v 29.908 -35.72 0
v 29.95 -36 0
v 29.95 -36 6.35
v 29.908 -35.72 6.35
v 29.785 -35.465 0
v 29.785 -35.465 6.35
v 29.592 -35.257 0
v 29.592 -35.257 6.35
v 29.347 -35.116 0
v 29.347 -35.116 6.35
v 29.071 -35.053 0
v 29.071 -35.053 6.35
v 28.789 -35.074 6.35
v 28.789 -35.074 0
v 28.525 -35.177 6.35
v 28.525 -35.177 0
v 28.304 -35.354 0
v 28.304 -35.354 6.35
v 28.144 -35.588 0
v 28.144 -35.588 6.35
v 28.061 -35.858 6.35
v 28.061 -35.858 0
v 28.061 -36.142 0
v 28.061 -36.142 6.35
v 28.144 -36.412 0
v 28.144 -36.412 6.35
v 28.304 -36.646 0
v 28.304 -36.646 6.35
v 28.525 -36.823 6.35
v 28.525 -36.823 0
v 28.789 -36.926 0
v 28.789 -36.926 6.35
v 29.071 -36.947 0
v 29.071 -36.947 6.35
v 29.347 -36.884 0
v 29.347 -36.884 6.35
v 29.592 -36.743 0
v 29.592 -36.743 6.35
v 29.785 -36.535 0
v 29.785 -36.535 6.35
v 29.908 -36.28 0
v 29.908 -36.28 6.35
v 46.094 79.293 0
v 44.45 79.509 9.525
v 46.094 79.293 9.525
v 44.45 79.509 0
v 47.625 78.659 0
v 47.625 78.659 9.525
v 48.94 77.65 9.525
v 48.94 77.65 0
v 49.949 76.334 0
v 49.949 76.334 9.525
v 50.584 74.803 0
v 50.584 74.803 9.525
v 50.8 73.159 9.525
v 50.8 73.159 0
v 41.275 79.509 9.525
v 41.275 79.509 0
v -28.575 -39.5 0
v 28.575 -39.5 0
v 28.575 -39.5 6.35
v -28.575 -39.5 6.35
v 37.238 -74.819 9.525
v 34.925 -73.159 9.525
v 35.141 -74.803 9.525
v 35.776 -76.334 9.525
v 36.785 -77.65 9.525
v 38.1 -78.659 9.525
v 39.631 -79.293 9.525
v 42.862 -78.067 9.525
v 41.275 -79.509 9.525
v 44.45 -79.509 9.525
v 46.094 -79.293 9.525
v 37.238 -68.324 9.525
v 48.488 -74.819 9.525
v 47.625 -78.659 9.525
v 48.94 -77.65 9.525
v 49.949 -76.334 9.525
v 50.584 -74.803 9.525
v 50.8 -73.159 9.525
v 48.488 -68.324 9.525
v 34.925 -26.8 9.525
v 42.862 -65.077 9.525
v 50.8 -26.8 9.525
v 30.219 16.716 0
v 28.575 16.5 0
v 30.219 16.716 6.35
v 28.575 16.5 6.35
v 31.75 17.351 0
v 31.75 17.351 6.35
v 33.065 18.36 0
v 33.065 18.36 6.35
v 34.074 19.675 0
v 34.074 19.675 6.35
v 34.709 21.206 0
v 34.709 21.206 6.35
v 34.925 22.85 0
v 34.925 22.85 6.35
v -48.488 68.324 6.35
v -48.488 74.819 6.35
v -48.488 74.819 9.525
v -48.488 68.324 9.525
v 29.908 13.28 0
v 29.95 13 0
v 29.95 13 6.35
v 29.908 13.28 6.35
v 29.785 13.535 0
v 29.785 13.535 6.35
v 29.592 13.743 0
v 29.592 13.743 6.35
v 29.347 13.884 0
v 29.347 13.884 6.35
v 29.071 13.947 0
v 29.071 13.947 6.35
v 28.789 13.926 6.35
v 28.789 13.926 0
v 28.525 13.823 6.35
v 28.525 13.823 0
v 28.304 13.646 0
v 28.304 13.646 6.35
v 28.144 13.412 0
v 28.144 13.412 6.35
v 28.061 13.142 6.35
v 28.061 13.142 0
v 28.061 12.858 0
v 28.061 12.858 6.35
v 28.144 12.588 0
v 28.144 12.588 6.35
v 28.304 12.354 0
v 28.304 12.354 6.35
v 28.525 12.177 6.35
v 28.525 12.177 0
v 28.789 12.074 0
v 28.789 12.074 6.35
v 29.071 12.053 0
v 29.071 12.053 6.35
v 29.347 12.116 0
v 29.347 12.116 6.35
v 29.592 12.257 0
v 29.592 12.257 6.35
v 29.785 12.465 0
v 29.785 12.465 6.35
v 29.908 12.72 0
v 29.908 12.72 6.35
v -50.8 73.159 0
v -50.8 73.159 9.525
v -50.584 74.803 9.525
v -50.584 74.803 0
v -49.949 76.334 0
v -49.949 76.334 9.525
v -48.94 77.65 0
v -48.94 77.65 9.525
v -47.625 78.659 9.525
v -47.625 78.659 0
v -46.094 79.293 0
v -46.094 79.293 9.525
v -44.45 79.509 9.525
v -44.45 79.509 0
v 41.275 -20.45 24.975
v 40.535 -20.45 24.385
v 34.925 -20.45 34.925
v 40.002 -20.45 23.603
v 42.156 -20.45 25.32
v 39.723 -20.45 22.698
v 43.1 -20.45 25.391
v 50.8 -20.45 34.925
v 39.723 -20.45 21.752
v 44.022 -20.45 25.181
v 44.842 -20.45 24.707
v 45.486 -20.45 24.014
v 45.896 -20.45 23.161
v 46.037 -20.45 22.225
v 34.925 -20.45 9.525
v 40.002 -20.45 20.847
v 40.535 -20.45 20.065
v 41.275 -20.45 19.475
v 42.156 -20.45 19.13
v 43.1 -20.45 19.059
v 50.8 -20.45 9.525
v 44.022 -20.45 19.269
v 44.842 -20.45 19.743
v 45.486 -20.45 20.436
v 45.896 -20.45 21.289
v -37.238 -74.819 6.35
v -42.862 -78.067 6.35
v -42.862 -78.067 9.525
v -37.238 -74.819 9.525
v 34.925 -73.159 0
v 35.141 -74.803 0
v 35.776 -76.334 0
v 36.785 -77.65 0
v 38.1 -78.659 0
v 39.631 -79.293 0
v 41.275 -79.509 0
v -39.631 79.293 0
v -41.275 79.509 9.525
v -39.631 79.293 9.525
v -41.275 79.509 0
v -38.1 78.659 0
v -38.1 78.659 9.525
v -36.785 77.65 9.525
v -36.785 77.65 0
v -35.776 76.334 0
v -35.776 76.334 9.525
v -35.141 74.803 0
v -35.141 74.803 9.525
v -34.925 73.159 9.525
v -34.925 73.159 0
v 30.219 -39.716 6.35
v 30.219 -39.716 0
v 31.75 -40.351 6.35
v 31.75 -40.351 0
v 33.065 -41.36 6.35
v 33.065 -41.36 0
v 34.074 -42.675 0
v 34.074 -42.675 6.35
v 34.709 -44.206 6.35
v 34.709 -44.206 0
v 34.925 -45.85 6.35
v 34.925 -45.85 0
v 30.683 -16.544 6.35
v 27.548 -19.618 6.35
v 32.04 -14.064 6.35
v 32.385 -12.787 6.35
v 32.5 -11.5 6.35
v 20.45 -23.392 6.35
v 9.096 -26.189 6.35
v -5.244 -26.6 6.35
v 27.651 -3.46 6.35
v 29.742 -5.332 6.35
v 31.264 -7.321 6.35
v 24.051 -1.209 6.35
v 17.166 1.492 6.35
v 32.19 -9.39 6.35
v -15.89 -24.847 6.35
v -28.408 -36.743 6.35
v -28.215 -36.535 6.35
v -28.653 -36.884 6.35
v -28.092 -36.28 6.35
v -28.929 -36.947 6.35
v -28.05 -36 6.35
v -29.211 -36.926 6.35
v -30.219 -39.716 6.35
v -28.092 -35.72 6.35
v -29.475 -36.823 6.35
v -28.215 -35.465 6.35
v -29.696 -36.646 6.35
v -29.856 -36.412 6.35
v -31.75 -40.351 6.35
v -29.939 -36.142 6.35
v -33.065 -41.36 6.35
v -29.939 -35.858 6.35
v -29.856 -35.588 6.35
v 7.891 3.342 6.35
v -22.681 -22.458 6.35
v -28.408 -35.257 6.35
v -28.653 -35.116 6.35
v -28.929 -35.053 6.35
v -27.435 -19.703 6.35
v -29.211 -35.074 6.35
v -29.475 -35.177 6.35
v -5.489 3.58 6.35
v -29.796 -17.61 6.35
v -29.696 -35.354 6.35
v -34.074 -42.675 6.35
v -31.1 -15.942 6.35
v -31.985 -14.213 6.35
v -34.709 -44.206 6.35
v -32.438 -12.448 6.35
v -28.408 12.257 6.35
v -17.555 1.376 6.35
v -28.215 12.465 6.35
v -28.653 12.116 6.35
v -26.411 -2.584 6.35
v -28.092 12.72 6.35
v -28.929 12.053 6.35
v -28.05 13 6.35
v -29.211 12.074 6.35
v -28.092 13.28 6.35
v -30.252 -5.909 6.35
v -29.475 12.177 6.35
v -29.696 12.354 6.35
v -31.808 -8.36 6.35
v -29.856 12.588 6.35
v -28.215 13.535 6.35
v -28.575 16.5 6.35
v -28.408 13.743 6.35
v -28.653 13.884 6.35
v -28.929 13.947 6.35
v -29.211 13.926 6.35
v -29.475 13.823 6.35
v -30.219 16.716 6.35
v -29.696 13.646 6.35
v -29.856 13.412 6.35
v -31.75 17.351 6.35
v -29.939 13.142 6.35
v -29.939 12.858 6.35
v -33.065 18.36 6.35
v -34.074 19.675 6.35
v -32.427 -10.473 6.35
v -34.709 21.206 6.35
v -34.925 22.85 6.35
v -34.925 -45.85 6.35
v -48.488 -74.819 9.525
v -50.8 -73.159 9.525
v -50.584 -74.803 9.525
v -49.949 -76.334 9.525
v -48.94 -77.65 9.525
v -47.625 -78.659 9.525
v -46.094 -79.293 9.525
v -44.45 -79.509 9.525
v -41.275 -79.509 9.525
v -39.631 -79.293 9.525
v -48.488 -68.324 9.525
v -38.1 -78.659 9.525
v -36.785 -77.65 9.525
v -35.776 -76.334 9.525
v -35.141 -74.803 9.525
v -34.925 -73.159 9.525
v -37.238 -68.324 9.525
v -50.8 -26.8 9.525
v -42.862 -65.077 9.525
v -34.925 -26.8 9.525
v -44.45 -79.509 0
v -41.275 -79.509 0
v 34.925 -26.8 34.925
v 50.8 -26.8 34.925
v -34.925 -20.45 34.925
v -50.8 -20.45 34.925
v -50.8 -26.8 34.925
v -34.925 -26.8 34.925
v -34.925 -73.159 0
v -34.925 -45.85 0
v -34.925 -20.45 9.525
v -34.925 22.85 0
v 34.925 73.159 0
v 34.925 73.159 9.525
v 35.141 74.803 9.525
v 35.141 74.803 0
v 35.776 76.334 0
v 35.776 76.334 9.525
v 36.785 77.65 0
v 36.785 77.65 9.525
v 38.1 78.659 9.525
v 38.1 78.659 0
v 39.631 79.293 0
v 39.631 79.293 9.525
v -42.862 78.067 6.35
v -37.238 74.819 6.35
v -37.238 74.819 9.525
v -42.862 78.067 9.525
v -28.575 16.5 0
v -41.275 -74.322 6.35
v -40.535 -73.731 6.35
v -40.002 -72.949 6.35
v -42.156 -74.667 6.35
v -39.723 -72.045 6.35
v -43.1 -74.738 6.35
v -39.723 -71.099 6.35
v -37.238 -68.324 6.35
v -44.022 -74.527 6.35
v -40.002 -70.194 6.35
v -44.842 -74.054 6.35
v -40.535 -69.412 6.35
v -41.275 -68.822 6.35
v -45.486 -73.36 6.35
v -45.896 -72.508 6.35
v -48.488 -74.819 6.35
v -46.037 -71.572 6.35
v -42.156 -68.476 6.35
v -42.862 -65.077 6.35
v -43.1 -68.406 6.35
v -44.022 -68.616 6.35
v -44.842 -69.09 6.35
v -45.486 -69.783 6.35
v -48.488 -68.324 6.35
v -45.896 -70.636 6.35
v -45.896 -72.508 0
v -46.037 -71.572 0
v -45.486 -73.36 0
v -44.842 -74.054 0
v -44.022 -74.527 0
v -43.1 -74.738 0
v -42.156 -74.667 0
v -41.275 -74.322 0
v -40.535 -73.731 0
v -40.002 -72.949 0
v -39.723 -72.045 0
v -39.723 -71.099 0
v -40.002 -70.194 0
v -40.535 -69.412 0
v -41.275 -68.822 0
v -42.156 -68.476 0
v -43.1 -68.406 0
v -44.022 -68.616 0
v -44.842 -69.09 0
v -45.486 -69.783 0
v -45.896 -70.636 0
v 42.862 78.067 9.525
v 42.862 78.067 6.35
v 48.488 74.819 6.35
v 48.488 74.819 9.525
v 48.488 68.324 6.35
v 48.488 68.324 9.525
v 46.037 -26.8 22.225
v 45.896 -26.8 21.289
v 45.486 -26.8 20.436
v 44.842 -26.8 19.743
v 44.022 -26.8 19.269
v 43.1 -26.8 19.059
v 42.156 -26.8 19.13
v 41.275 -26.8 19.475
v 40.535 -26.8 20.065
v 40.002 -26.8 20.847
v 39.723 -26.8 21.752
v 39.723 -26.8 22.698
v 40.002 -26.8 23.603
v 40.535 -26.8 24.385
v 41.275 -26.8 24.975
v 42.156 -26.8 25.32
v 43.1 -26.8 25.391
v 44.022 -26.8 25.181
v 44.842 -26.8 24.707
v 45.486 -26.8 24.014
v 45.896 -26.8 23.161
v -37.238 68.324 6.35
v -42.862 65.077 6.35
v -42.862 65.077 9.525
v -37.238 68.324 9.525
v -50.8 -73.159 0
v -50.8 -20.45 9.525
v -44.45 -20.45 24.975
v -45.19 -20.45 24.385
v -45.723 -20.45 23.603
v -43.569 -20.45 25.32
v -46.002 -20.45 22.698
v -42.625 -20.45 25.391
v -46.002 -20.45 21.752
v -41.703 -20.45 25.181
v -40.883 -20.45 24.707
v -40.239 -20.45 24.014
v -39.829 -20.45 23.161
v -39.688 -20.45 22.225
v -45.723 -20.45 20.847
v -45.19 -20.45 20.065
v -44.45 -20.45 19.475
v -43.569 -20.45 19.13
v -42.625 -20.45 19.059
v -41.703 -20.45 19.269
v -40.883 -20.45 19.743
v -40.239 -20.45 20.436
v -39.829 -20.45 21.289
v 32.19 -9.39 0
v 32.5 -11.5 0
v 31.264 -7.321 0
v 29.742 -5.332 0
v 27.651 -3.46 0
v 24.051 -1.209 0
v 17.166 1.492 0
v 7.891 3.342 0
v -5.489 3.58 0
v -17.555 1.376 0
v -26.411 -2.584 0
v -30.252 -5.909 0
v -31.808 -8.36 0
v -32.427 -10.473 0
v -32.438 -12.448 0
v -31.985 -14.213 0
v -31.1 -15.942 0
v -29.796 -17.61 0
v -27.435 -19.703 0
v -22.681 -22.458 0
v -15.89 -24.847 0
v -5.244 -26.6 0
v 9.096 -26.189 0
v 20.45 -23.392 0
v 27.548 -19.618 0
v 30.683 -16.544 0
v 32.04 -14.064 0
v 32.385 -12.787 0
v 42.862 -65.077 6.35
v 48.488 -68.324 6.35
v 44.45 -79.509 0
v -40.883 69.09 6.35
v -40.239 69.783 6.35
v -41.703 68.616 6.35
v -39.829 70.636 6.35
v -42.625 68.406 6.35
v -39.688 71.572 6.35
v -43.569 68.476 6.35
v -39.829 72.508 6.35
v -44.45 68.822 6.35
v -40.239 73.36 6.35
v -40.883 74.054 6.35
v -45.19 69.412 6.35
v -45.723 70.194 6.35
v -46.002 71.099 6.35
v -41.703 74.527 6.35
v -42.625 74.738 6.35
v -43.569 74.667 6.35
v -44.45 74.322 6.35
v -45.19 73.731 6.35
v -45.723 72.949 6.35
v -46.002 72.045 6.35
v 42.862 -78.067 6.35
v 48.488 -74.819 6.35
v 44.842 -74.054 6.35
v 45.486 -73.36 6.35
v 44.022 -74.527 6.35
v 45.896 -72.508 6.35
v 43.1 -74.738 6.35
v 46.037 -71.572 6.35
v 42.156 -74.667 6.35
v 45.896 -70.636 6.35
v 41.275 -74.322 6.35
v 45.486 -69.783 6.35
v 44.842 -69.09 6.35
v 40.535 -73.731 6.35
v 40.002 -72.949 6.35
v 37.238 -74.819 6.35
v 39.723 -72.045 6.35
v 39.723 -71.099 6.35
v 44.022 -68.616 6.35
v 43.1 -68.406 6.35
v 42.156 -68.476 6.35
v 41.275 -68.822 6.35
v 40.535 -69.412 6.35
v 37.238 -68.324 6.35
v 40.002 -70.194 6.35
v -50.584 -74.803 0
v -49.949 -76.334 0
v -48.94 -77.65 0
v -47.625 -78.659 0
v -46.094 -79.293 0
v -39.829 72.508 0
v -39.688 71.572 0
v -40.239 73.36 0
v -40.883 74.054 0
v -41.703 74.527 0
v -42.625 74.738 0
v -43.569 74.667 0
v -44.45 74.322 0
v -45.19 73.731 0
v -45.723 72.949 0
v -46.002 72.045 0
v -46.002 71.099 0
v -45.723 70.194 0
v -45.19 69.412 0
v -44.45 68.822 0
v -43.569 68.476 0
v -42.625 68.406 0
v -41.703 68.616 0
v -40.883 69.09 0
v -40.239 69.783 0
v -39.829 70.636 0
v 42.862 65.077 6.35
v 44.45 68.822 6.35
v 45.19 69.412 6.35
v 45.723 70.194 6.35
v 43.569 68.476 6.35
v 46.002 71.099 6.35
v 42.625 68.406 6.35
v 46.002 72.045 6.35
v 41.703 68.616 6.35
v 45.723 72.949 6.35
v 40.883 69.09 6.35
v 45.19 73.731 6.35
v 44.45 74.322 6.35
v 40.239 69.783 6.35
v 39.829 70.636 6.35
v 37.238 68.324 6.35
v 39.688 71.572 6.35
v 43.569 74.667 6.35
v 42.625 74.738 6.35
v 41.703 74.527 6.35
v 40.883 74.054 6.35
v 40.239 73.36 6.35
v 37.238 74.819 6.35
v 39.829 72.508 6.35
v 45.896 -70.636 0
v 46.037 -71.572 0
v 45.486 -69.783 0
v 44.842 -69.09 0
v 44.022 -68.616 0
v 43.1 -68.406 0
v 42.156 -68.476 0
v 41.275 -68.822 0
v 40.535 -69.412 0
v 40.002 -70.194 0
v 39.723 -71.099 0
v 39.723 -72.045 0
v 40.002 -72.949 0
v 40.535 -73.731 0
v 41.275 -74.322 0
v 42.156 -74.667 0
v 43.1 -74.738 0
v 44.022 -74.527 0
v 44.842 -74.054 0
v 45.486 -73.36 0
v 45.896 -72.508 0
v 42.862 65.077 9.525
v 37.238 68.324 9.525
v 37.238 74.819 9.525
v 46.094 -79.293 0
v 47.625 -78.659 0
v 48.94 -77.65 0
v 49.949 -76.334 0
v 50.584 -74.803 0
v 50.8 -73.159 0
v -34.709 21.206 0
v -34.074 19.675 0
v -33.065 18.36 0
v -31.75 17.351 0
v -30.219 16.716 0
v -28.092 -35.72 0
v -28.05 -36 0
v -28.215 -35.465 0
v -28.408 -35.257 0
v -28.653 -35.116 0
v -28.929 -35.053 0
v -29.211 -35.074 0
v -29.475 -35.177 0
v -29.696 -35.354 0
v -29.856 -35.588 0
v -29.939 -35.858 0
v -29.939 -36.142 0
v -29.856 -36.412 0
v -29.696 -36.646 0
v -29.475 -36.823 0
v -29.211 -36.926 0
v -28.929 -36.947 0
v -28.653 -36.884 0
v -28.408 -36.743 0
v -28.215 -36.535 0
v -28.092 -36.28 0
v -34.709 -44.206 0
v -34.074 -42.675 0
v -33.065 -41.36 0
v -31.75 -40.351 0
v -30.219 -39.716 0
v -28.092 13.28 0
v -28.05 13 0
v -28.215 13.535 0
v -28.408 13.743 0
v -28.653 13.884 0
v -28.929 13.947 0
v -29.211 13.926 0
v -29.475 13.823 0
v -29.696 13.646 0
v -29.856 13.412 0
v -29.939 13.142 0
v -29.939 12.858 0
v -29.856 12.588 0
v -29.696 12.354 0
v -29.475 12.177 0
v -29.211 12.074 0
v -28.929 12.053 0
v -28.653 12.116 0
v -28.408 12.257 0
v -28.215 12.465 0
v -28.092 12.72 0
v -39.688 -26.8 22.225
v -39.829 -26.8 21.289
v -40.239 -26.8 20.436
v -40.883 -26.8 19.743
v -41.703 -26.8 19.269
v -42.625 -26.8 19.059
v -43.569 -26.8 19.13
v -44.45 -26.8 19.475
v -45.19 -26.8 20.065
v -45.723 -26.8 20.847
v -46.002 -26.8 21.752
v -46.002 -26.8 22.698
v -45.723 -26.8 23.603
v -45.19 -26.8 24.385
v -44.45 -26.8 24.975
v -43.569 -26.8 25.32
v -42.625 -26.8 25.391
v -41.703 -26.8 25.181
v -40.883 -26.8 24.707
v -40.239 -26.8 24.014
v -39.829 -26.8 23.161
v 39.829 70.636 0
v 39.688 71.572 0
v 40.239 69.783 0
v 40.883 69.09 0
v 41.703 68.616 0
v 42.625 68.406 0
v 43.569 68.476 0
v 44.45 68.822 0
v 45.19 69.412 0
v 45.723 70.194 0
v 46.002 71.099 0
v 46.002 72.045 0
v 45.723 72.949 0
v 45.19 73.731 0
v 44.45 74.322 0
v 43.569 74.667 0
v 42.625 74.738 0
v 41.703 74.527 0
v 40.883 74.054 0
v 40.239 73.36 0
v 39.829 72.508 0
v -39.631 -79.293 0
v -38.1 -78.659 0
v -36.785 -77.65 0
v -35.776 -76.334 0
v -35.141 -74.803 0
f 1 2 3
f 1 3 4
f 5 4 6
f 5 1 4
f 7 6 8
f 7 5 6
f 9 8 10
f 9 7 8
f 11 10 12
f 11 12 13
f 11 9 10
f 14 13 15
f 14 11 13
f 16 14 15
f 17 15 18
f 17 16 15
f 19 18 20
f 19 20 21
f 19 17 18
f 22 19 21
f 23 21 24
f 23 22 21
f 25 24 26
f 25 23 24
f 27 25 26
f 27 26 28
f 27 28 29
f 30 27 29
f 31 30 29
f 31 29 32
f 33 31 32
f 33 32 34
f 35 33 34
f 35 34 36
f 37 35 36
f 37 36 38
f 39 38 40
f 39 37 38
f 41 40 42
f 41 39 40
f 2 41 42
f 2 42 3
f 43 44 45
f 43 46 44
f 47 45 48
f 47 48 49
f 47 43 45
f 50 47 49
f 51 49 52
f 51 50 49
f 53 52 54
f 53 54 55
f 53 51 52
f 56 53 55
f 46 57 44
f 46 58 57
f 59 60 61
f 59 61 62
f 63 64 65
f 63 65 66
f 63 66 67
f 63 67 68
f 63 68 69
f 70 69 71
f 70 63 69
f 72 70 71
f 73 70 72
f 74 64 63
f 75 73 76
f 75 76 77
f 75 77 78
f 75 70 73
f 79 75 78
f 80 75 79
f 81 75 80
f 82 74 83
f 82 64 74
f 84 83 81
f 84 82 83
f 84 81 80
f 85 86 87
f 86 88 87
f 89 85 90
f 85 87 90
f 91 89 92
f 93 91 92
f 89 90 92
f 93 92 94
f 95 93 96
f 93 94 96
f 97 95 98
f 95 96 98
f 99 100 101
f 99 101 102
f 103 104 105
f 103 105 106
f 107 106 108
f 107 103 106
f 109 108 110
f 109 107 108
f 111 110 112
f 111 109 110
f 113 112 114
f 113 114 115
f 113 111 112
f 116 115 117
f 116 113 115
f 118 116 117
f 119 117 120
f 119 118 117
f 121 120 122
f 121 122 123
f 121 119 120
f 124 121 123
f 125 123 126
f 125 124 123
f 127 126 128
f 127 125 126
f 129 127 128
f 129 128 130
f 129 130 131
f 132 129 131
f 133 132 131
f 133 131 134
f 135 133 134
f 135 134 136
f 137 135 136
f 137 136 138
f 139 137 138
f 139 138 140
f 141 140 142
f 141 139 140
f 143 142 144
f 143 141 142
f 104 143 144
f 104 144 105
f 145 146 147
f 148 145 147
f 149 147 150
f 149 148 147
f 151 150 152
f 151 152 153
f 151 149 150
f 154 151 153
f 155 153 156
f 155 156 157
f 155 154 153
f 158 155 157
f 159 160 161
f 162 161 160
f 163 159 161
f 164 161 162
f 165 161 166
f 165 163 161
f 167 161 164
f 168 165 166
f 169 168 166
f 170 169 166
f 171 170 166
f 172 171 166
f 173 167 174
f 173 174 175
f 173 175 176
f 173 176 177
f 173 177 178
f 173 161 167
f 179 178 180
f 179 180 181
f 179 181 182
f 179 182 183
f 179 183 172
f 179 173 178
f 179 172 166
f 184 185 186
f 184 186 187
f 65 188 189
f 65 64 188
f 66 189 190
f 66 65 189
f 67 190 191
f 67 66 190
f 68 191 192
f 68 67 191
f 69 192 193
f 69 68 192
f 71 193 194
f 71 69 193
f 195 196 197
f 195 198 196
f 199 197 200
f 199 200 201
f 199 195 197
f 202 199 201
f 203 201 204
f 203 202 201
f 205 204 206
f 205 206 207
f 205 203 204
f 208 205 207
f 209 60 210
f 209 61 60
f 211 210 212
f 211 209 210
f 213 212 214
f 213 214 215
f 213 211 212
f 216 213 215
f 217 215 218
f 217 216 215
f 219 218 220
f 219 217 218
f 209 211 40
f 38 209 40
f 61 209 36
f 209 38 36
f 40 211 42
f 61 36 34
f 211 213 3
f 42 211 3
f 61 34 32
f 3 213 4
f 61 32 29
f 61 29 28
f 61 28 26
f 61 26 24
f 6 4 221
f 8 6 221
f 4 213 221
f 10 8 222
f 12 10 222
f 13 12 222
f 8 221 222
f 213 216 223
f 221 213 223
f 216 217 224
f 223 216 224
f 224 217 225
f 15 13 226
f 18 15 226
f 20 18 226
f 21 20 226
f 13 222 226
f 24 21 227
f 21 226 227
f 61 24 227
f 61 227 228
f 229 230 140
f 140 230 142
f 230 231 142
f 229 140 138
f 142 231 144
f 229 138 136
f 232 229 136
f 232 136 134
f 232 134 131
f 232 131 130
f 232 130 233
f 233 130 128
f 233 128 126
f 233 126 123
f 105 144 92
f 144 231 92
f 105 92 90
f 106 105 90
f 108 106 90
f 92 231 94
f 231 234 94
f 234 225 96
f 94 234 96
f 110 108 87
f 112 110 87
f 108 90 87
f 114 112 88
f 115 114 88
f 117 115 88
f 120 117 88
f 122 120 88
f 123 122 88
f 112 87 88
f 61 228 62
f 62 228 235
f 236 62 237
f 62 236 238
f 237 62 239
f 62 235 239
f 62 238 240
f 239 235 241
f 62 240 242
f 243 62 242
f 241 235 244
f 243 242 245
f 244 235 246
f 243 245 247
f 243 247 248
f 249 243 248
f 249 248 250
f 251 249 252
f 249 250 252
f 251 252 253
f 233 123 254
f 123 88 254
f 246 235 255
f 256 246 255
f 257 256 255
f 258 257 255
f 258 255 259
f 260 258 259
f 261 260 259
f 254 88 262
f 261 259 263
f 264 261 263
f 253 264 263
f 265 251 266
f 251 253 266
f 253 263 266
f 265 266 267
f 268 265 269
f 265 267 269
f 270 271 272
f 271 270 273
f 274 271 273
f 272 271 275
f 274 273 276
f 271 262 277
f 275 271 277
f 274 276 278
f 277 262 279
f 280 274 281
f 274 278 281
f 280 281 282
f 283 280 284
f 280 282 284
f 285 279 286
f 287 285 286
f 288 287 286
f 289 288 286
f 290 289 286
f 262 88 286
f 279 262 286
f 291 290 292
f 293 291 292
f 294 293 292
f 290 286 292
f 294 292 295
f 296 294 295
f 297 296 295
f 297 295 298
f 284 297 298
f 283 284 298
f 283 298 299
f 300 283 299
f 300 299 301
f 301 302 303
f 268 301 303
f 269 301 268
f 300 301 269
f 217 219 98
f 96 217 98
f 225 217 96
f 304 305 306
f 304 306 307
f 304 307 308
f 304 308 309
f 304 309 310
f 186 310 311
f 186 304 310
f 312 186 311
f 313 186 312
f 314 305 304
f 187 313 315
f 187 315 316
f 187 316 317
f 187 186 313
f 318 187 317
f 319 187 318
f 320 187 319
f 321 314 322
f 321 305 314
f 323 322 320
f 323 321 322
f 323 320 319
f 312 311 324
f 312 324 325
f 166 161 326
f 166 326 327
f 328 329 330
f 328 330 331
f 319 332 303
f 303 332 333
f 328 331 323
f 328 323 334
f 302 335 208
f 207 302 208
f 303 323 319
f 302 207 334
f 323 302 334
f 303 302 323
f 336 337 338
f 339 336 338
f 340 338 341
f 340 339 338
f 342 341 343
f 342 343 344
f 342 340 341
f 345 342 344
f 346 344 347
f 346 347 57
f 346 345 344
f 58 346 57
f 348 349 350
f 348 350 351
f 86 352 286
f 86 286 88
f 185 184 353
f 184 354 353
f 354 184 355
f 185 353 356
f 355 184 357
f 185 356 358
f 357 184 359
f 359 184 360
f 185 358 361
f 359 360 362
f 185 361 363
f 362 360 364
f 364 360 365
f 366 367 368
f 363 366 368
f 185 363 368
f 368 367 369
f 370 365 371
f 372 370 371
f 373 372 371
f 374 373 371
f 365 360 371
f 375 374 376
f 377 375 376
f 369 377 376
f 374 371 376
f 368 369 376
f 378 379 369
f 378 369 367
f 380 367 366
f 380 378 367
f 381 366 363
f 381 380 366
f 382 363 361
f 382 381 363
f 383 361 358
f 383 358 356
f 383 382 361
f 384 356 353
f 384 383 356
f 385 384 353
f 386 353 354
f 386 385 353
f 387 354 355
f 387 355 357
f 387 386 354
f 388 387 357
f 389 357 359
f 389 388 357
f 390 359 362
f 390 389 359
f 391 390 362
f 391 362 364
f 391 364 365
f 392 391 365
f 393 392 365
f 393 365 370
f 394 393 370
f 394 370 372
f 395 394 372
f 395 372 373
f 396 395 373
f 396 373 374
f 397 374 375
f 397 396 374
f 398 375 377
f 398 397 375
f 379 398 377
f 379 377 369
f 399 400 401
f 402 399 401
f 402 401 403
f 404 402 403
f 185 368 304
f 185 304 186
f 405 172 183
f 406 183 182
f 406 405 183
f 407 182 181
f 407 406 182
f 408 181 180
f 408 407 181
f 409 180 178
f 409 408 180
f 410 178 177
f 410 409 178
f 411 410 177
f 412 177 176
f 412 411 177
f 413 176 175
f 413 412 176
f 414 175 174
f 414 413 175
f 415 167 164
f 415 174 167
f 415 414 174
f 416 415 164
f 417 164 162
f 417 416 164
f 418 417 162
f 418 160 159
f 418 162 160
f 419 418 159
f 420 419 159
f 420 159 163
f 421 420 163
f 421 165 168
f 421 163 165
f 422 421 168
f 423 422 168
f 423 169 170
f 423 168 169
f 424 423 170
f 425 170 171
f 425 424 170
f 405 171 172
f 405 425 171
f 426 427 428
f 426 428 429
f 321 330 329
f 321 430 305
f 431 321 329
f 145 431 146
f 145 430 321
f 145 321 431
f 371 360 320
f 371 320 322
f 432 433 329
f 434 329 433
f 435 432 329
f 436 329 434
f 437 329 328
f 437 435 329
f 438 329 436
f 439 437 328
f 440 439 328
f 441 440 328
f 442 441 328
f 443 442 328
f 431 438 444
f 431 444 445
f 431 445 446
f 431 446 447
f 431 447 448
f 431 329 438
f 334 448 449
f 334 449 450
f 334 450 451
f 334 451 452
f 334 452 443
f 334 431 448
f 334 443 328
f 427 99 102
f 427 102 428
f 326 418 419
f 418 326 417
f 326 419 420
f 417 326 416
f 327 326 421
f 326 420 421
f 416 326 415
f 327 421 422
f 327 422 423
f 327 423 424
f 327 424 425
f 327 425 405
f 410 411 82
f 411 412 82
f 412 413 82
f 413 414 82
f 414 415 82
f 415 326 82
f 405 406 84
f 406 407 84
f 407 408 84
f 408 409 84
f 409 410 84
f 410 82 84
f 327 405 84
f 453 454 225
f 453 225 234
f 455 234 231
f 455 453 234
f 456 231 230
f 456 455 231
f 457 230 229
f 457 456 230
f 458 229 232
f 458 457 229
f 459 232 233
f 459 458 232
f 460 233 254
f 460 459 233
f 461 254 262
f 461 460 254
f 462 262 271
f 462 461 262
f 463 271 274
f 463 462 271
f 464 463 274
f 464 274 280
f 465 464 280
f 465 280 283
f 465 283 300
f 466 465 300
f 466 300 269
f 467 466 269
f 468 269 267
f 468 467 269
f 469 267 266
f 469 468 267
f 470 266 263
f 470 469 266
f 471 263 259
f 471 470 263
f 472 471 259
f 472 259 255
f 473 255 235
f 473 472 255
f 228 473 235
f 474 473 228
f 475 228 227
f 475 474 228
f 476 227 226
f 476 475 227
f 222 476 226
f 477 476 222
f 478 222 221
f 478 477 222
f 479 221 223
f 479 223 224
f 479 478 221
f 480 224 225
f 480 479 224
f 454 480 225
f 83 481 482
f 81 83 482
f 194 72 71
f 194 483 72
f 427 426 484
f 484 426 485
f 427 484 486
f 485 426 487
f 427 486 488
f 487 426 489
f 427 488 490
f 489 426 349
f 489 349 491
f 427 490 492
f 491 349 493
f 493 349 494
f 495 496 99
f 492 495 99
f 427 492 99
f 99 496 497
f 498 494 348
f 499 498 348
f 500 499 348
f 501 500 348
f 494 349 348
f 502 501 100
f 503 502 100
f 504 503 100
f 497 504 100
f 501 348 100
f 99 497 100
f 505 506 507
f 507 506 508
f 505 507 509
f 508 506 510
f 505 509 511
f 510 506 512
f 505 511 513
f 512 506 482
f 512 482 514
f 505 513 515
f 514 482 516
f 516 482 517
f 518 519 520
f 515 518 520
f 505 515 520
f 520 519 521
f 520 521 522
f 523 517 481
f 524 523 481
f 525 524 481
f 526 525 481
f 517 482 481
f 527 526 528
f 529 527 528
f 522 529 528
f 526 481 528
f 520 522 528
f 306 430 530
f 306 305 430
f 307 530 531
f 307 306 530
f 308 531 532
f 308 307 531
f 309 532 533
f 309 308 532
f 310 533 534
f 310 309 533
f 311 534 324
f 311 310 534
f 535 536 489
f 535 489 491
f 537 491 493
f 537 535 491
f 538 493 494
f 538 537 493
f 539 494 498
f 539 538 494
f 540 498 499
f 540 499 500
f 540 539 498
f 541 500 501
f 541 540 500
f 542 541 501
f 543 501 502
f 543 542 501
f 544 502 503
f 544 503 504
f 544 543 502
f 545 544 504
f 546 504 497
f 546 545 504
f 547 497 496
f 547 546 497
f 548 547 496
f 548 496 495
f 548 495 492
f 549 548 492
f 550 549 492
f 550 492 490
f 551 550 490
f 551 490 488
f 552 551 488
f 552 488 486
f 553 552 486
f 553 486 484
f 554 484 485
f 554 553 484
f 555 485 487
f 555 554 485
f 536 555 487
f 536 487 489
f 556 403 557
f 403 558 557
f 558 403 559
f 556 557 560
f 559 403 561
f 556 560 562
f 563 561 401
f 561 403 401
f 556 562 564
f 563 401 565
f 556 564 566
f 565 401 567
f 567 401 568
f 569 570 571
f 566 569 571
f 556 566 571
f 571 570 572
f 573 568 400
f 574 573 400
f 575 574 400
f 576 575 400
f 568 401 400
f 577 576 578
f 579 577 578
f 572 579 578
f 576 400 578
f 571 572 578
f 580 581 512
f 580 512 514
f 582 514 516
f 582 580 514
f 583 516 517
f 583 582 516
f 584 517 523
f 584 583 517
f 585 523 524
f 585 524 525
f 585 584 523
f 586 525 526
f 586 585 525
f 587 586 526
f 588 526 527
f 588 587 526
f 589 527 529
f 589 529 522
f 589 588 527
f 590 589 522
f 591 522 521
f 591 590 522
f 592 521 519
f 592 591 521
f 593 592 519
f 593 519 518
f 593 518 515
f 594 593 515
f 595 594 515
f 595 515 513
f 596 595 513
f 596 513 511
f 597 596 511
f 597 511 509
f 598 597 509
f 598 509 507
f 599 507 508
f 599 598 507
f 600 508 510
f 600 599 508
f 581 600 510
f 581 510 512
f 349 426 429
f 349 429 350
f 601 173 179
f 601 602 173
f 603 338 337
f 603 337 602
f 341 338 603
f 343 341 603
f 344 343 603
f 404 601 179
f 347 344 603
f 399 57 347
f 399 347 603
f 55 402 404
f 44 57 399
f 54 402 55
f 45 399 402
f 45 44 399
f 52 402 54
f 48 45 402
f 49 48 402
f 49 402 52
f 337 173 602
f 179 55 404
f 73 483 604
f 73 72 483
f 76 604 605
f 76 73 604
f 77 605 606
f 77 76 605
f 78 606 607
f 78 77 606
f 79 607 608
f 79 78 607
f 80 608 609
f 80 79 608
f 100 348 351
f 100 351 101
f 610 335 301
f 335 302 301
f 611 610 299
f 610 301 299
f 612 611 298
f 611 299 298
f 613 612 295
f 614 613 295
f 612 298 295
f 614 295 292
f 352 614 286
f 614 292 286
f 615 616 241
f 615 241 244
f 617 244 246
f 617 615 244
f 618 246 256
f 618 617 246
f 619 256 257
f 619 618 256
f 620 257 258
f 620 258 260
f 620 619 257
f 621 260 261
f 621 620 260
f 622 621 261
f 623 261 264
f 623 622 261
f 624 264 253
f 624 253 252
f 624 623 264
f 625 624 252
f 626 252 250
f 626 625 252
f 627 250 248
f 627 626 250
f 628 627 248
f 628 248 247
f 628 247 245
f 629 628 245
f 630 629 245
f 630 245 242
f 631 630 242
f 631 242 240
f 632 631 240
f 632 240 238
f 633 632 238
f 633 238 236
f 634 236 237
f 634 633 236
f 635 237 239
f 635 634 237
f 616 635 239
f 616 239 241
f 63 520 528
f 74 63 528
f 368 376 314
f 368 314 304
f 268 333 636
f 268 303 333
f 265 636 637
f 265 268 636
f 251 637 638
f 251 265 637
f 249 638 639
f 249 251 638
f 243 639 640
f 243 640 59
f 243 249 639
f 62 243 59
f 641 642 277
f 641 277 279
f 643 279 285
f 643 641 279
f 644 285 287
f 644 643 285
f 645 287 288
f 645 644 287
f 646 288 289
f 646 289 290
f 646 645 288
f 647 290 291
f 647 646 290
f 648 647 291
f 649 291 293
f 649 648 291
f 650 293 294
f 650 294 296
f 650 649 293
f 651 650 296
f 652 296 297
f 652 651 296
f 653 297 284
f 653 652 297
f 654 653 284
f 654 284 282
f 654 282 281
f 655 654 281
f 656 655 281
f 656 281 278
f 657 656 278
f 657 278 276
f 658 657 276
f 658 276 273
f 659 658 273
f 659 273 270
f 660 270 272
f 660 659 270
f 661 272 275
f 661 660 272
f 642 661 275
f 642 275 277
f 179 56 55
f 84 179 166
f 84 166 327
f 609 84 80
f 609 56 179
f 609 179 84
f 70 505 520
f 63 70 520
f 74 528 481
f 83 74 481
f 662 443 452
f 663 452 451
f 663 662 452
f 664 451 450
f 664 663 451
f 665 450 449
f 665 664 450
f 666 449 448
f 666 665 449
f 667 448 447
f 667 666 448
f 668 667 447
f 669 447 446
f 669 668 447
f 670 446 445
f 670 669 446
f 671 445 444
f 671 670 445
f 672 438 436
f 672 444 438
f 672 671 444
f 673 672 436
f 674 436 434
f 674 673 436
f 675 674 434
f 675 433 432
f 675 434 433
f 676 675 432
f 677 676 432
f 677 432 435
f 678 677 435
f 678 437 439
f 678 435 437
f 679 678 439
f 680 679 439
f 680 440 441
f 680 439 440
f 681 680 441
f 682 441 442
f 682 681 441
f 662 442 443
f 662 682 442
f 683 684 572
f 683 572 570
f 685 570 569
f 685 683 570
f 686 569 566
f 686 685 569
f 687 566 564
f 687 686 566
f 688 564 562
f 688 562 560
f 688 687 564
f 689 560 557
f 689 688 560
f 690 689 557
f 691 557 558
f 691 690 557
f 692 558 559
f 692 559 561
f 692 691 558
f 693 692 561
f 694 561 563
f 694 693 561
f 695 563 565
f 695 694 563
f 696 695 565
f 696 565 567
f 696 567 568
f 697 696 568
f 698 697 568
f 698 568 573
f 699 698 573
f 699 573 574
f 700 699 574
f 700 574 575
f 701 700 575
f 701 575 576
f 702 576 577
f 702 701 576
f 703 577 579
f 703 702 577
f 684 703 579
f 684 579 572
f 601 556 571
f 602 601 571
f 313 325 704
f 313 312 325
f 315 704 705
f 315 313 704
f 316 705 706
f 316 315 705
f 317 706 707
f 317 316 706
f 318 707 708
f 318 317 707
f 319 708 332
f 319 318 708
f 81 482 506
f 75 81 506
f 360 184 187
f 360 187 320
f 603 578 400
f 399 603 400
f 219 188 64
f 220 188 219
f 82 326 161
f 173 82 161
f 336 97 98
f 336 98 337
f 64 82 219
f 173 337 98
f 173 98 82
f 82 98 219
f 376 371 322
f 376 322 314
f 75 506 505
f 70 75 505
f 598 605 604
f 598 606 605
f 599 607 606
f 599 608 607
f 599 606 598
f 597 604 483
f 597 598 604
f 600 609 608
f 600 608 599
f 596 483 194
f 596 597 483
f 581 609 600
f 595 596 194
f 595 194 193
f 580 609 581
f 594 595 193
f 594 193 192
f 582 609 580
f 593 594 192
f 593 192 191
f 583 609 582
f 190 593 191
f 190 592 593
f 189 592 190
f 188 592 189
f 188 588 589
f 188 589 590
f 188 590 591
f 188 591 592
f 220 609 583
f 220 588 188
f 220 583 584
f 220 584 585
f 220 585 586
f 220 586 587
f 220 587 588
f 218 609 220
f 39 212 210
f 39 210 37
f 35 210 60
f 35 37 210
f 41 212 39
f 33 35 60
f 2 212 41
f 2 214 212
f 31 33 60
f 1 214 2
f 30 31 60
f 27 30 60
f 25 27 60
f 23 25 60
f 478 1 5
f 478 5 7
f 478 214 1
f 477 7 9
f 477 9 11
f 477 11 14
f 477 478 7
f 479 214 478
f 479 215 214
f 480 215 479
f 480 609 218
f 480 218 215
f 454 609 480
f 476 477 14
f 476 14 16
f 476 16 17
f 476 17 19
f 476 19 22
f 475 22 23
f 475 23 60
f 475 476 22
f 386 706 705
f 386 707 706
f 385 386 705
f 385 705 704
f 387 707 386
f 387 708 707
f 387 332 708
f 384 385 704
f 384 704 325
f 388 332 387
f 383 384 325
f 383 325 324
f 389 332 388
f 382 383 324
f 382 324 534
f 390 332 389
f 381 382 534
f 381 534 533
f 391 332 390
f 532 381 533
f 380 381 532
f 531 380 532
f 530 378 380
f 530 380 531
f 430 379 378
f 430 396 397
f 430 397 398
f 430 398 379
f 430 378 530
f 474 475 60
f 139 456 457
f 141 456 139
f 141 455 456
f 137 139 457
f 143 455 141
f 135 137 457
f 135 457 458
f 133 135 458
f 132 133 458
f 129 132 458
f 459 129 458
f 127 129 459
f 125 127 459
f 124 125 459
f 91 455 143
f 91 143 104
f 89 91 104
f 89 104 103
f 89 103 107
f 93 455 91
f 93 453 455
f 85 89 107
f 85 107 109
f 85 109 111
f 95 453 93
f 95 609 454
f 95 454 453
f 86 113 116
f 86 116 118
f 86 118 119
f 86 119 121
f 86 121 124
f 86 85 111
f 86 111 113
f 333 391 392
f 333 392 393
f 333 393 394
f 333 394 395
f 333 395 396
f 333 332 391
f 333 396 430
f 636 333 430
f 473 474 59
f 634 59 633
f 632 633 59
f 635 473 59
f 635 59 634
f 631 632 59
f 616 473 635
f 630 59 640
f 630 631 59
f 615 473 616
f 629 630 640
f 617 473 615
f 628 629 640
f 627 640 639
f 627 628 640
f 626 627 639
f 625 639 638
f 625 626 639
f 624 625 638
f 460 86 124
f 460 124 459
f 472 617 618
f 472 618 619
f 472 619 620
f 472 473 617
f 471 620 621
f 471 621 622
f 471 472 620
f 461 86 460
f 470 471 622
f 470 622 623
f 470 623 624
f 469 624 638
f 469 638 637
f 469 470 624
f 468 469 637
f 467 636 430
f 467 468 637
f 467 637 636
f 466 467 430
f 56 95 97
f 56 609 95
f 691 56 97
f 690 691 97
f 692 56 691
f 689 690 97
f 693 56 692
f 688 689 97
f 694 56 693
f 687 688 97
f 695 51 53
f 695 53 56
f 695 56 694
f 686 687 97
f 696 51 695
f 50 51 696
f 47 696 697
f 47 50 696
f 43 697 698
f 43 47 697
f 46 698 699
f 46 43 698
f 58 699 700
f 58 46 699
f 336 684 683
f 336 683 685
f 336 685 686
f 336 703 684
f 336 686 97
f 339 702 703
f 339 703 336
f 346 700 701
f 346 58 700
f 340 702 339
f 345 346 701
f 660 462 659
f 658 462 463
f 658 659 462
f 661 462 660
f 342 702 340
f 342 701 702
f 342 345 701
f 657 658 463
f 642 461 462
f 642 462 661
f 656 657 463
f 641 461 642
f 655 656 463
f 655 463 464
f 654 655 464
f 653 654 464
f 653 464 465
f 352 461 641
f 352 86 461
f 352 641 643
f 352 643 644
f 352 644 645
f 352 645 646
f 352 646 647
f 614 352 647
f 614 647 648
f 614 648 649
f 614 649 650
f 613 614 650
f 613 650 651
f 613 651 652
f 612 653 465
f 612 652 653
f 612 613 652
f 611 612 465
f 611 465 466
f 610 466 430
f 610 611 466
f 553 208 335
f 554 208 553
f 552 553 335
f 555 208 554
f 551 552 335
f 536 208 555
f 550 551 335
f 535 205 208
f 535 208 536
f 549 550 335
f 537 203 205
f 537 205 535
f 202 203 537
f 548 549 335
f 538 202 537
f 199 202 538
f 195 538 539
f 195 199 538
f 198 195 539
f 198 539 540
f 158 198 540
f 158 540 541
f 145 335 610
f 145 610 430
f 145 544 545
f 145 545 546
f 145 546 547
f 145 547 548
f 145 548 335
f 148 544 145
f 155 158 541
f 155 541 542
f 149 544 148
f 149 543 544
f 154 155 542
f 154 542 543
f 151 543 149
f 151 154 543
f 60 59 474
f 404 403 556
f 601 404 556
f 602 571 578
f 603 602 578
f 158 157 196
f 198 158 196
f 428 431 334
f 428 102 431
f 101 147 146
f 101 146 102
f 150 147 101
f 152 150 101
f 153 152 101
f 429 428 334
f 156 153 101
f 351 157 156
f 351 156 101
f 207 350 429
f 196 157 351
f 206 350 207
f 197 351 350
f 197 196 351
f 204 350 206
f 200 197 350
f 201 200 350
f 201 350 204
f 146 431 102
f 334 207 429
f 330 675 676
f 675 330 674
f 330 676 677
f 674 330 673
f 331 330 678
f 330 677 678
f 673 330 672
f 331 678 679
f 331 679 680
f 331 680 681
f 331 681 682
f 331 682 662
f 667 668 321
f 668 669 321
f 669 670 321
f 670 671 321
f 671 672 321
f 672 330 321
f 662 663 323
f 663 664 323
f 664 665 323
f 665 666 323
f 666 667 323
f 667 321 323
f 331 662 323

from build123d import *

# Parameters (mm, degrees)
SKETCH1_R           = 0.95
SKETCH1_R_2         = 3.175
SKETCH1_RX          = 32.5
SKETCH1_RY          = 15.3
BOSS_EXTRUDE1_DEPTH = 6.35
SKETCH2_W           = 15.875
SKETCH2_H           = 159.01875
BOSS_EXTRUDE2_DEPTH = 3.175
SKETCH3_W           = 15.875
SKETCH3_H           = 6.35
BOSS_EXTRUDE3_DEPTH = 25.4
SKETCH4_R           = 3.175
CUT_EXTRUDE1_DEPTH  = 123.890515655
FILLET2_R           = 6.35


with BuildPart() as part:
    # Sketch1 → Boss-Extrude1 (new body)
    with BuildSketch(Plane.XY):
        Polygon((-50.8, -79.509375), (-50.8, 79.509375), (-34.925, 79.509375), (-34.925, 16.5), (34.925, 16.5), (34.925, 79.509375), (50.8, 79.509375), (50.8, -79.509375), (34.925, -79.509375), (34.925, -39.5), (-34.925, -39.5), (-34.925, -79.509375), align=None)
        with Locations((29, 13)):
            Circle(SKETCH1_R, mode=Mode.SUBTRACT)
        with Locations((29, -36)):
            Circle(SKETCH1_R, mode=Mode.SUBTRACT)
        with Locations((-29, -36)):
            Circle(SKETCH1_R, mode=Mode.SUBTRACT)
        with Locations((-29, 13)):
            Circle(SKETCH1_R, mode=Mode.SUBTRACT)
        with Locations((-42.8625, 71.571875)):
            Circle(SKETCH1_R_2, mode=Mode.SUBTRACT)
        with Locations(Location((42.8625, 71.571875, 0), (0, 0, 180))):
            Circle(SKETCH1_R_2, mode=Mode.SUBTRACT)
        with Locations(Location((-42.8625, -71.571875, 0), (0, 0, 180))):
            Circle(SKETCH1_R_2, mode=Mode.SUBTRACT)
        with Locations((42.8625, -71.571875)):
            Circle(SKETCH1_R_2, mode=Mode.SUBTRACT)
        with Locations(Location((0, -11.5), (0, 0, 0))):
            Ellipse(SKETCH1_RX, SKETCH1_RY, mode=Mode.SUBTRACT)
    extrude(amount=BOSS_EXTRUDE1_DEPTH)

    # Sketch2 → Boss-Extrude2 (add)
    # profile 1 of 2: a face of its own
    with BuildSketch(Plane.XY.offset(6.35)):
        with Locations((-42.8625, 0)):
            Rectangle(SKETCH2_W, SKETCH2_H)
        Polygon((-48.4875, 68.324279736), (-42.8625, 65.076684472), (-37.2375, 68.324279736), (-37.2375, 74.819470264), (-42.8625, 78.067065528), (-48.4875, 74.819470264), align=None, mode=Mode.SUBTRACT)
        Polygon((-37.2375, -68.324279736), (-42.8625, -65.076684472), (-48.4875, -68.324279736), (-48.4875, -74.819470264), (-42.8625, -78.067065528), (-37.2375, -74.819470264), align=None, mode=Mode.SUBTRACT)
    # profile 2 of 2: a face of its own
    with BuildSketch(Plane.XY.offset(6.35)):
        with Locations((42.8625, 0)):
            Rectangle(SKETCH2_W, SKETCH2_H)
        Polygon((37.2375, -74.819470264), (37.2375, -68.324279736), (42.8625, -65.076684472), (48.4875, -68.324279736), (48.4875, -74.819470264), (42.8625, -78.067065528), align=None, mode=Mode.SUBTRACT)
        Polygon((48.4875, 74.819470264), (48.4875, 68.324279736), (42.8625, 65.076684472), (37.2375, 68.324279736), (37.2375, 74.819470264), (42.8625, 78.067065528), align=None, mode=Mode.SUBTRACT)
    extrude(amount=BOSS_EXTRUDE2_DEPTH)

    # Sketch3 → Boss-Extrude3 (add)
    with BuildSketch(Plane.XY.offset(9.525)):
        with Locations((-42.8625, -23.625)):
            Rectangle(SKETCH3_W, SKETCH3_H)
        with Locations((42.8625, -23.625)):
            Rectangle(SKETCH3_W, SKETCH3_H)
    extrude(amount=BOSS_EXTRUDE3_DEPTH)

    # Sketch4 → Cut-Extrude1 (cut, through all)
    with BuildSketch(Plane(origin=(0, -26.8, 0), x_dir=(1, 0, 0), z_dir=(0, 1, 0))):
        with Locations((-42.8625, -22.225)):
            Circle(SKETCH4_R)
        with Locations((42.8625, -22.225)):
            Circle(SKETCH4_R)
    extrude(amount=CUT_EXTRUDE1_DEPTH, mode=Mode.SUBTRACT)

    # Fillet2
    fillet2_edges = [part.edges().sort_by_distance(p)[0] for p in [
        (-50.8, -79.509375, 4.7625),
        (-50.8, 79.509375, 4.7625),
        (-34.925, 79.509375, 4.7625),
        (-34.925, 16.5, 3.175),
        (34.925, 16.5, 3.175),
        (34.925, 79.509375, 4.7625),
        (50.8, 79.509375, 4.7625),
        (50.8, -79.509375, 4.7625),
        (34.925, -79.509375, 4.7625),
        (34.925, -39.5, 3.175),
        (-34.925, -39.5, 3.175),
        (-34.925, -79.509375, 4.7625),
    ]]
    fillet(fillet2_edges, radius=FILLET2_R)


solid = part.part
